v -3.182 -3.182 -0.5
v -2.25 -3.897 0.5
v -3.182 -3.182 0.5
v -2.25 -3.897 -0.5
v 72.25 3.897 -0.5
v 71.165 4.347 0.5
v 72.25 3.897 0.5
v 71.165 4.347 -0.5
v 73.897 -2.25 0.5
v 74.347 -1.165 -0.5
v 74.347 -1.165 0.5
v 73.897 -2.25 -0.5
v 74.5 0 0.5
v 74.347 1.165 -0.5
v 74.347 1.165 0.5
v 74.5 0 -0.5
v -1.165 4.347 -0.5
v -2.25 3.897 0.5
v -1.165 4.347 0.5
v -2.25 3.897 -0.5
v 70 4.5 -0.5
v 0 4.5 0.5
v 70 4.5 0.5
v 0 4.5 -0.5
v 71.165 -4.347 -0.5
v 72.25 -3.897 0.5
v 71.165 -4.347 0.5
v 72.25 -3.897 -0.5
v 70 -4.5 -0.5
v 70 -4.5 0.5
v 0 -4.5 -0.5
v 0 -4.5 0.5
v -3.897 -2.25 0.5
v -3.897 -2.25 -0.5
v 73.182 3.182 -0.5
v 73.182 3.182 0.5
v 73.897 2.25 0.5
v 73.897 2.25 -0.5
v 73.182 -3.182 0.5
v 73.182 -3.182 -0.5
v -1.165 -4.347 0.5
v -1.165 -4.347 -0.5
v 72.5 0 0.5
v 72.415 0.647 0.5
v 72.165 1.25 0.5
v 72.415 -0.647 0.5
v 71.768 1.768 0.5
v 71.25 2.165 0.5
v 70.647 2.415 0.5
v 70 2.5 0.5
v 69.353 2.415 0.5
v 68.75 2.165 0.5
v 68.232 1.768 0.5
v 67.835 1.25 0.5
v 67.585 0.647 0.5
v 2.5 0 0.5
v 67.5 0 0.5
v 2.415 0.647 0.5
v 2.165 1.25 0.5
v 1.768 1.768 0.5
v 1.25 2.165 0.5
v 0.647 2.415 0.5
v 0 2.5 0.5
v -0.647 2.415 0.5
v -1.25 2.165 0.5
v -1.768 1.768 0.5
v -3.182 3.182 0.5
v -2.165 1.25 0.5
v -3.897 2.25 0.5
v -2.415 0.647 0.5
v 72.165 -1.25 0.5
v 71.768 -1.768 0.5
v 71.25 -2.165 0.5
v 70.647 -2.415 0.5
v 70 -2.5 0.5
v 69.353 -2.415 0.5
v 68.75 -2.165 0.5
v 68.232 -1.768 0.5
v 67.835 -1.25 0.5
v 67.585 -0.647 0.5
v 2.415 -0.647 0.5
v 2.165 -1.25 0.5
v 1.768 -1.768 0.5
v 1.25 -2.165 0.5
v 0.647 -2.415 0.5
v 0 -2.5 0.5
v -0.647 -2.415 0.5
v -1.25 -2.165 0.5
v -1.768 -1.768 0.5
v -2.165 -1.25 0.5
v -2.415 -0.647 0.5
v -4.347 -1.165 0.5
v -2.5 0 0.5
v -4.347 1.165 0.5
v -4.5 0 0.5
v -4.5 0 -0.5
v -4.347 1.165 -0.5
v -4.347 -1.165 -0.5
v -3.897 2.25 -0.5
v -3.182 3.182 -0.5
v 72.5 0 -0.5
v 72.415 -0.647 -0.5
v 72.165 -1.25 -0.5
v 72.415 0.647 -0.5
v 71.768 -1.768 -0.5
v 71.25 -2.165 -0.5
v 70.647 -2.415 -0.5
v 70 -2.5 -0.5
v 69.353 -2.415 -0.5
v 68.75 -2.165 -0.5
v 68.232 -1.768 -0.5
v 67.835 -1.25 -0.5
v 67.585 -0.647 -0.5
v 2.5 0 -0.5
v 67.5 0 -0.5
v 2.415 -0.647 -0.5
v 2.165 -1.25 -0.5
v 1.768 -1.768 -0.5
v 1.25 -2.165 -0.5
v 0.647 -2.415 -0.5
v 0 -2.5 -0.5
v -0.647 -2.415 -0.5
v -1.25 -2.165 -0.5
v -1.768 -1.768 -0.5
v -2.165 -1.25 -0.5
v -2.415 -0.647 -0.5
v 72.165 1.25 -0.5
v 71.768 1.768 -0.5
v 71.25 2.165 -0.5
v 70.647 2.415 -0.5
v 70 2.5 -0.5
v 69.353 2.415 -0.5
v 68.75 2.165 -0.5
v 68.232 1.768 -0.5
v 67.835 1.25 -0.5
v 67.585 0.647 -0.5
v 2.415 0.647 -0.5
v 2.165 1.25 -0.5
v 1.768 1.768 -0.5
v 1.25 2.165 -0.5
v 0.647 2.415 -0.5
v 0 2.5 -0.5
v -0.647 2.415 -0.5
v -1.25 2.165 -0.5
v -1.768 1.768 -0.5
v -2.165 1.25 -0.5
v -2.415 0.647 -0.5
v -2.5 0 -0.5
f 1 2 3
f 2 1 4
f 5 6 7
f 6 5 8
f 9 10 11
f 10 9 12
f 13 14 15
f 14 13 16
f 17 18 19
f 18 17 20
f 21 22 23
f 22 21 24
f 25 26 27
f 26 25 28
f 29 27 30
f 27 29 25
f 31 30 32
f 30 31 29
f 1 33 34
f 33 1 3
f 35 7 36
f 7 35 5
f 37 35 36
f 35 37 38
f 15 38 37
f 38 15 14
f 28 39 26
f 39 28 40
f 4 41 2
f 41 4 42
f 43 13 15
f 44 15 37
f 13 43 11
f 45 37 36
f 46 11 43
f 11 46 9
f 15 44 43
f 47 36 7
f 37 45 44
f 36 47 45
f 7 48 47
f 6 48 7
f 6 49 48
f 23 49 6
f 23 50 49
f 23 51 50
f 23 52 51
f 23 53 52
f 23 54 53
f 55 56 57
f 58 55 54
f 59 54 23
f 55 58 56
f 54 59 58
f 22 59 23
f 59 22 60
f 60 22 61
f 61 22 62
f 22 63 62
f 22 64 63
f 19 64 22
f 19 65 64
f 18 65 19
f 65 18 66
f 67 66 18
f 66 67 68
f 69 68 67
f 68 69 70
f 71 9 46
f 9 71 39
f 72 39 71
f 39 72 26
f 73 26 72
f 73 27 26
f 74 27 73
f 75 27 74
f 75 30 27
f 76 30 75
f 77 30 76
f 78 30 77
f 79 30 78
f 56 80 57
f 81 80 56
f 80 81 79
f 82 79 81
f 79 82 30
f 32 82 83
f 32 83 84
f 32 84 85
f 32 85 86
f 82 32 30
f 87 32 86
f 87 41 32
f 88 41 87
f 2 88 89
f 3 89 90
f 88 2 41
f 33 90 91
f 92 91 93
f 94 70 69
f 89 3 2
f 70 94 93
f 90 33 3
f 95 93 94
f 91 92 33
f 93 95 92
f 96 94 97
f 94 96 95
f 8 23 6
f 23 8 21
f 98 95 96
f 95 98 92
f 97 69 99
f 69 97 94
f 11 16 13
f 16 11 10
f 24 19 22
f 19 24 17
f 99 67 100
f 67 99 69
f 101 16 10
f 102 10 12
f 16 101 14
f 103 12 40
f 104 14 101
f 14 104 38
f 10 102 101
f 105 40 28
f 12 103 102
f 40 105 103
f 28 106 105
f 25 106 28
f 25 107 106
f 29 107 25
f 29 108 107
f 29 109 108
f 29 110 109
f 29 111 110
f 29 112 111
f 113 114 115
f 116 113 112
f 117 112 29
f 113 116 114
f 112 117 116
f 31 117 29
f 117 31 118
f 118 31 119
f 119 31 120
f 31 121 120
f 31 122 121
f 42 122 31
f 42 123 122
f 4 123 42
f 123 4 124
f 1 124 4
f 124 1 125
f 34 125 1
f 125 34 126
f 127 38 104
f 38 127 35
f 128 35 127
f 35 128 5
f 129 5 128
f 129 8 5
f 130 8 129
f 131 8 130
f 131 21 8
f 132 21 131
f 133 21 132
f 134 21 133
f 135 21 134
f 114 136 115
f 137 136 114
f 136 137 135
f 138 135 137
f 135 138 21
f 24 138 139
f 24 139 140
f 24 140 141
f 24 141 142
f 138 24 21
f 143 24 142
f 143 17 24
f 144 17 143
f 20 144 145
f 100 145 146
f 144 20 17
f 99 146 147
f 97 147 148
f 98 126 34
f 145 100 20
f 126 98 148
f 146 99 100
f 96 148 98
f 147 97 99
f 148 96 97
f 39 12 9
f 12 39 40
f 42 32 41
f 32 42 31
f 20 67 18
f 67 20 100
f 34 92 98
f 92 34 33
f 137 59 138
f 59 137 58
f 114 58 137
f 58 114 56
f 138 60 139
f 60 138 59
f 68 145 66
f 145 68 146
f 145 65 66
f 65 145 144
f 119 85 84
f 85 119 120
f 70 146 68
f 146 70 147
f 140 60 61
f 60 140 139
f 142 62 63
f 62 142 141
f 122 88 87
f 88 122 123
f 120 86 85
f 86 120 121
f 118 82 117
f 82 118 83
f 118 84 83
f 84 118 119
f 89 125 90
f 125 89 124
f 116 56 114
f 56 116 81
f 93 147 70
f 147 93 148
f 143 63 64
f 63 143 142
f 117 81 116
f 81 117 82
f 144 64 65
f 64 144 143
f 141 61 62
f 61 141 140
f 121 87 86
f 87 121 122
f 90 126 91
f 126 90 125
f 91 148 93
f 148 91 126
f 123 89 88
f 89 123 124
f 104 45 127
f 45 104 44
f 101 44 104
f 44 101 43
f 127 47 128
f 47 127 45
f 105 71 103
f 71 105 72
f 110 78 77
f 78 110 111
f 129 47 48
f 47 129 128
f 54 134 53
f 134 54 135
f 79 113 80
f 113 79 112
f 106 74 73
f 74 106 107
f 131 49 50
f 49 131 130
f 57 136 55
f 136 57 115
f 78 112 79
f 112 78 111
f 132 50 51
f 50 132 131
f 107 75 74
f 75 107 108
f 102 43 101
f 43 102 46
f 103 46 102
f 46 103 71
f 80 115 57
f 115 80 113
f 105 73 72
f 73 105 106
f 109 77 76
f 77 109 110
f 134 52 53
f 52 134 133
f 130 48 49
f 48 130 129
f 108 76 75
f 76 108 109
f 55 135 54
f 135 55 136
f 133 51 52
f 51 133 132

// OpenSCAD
length = 70; //mm
width = 5; //mm
extra = 2; //mm
thickness = 1; //mm
$fn=24;

difference() {
  hull() {
    cylinder(d=width + 2 * extra, h=thickness, center = true);
    translate([length, 0, 0]) {
      cylinder(d=width + 2 * extra, h=thickness, center = true);
    }
  }
  cylinder(d=width, h=thickness + 0.1, center = true);
  translate([length, 0, 0]) {
    cylinder(d=width, h=thickness + 0.1, center = true);
  }
}
